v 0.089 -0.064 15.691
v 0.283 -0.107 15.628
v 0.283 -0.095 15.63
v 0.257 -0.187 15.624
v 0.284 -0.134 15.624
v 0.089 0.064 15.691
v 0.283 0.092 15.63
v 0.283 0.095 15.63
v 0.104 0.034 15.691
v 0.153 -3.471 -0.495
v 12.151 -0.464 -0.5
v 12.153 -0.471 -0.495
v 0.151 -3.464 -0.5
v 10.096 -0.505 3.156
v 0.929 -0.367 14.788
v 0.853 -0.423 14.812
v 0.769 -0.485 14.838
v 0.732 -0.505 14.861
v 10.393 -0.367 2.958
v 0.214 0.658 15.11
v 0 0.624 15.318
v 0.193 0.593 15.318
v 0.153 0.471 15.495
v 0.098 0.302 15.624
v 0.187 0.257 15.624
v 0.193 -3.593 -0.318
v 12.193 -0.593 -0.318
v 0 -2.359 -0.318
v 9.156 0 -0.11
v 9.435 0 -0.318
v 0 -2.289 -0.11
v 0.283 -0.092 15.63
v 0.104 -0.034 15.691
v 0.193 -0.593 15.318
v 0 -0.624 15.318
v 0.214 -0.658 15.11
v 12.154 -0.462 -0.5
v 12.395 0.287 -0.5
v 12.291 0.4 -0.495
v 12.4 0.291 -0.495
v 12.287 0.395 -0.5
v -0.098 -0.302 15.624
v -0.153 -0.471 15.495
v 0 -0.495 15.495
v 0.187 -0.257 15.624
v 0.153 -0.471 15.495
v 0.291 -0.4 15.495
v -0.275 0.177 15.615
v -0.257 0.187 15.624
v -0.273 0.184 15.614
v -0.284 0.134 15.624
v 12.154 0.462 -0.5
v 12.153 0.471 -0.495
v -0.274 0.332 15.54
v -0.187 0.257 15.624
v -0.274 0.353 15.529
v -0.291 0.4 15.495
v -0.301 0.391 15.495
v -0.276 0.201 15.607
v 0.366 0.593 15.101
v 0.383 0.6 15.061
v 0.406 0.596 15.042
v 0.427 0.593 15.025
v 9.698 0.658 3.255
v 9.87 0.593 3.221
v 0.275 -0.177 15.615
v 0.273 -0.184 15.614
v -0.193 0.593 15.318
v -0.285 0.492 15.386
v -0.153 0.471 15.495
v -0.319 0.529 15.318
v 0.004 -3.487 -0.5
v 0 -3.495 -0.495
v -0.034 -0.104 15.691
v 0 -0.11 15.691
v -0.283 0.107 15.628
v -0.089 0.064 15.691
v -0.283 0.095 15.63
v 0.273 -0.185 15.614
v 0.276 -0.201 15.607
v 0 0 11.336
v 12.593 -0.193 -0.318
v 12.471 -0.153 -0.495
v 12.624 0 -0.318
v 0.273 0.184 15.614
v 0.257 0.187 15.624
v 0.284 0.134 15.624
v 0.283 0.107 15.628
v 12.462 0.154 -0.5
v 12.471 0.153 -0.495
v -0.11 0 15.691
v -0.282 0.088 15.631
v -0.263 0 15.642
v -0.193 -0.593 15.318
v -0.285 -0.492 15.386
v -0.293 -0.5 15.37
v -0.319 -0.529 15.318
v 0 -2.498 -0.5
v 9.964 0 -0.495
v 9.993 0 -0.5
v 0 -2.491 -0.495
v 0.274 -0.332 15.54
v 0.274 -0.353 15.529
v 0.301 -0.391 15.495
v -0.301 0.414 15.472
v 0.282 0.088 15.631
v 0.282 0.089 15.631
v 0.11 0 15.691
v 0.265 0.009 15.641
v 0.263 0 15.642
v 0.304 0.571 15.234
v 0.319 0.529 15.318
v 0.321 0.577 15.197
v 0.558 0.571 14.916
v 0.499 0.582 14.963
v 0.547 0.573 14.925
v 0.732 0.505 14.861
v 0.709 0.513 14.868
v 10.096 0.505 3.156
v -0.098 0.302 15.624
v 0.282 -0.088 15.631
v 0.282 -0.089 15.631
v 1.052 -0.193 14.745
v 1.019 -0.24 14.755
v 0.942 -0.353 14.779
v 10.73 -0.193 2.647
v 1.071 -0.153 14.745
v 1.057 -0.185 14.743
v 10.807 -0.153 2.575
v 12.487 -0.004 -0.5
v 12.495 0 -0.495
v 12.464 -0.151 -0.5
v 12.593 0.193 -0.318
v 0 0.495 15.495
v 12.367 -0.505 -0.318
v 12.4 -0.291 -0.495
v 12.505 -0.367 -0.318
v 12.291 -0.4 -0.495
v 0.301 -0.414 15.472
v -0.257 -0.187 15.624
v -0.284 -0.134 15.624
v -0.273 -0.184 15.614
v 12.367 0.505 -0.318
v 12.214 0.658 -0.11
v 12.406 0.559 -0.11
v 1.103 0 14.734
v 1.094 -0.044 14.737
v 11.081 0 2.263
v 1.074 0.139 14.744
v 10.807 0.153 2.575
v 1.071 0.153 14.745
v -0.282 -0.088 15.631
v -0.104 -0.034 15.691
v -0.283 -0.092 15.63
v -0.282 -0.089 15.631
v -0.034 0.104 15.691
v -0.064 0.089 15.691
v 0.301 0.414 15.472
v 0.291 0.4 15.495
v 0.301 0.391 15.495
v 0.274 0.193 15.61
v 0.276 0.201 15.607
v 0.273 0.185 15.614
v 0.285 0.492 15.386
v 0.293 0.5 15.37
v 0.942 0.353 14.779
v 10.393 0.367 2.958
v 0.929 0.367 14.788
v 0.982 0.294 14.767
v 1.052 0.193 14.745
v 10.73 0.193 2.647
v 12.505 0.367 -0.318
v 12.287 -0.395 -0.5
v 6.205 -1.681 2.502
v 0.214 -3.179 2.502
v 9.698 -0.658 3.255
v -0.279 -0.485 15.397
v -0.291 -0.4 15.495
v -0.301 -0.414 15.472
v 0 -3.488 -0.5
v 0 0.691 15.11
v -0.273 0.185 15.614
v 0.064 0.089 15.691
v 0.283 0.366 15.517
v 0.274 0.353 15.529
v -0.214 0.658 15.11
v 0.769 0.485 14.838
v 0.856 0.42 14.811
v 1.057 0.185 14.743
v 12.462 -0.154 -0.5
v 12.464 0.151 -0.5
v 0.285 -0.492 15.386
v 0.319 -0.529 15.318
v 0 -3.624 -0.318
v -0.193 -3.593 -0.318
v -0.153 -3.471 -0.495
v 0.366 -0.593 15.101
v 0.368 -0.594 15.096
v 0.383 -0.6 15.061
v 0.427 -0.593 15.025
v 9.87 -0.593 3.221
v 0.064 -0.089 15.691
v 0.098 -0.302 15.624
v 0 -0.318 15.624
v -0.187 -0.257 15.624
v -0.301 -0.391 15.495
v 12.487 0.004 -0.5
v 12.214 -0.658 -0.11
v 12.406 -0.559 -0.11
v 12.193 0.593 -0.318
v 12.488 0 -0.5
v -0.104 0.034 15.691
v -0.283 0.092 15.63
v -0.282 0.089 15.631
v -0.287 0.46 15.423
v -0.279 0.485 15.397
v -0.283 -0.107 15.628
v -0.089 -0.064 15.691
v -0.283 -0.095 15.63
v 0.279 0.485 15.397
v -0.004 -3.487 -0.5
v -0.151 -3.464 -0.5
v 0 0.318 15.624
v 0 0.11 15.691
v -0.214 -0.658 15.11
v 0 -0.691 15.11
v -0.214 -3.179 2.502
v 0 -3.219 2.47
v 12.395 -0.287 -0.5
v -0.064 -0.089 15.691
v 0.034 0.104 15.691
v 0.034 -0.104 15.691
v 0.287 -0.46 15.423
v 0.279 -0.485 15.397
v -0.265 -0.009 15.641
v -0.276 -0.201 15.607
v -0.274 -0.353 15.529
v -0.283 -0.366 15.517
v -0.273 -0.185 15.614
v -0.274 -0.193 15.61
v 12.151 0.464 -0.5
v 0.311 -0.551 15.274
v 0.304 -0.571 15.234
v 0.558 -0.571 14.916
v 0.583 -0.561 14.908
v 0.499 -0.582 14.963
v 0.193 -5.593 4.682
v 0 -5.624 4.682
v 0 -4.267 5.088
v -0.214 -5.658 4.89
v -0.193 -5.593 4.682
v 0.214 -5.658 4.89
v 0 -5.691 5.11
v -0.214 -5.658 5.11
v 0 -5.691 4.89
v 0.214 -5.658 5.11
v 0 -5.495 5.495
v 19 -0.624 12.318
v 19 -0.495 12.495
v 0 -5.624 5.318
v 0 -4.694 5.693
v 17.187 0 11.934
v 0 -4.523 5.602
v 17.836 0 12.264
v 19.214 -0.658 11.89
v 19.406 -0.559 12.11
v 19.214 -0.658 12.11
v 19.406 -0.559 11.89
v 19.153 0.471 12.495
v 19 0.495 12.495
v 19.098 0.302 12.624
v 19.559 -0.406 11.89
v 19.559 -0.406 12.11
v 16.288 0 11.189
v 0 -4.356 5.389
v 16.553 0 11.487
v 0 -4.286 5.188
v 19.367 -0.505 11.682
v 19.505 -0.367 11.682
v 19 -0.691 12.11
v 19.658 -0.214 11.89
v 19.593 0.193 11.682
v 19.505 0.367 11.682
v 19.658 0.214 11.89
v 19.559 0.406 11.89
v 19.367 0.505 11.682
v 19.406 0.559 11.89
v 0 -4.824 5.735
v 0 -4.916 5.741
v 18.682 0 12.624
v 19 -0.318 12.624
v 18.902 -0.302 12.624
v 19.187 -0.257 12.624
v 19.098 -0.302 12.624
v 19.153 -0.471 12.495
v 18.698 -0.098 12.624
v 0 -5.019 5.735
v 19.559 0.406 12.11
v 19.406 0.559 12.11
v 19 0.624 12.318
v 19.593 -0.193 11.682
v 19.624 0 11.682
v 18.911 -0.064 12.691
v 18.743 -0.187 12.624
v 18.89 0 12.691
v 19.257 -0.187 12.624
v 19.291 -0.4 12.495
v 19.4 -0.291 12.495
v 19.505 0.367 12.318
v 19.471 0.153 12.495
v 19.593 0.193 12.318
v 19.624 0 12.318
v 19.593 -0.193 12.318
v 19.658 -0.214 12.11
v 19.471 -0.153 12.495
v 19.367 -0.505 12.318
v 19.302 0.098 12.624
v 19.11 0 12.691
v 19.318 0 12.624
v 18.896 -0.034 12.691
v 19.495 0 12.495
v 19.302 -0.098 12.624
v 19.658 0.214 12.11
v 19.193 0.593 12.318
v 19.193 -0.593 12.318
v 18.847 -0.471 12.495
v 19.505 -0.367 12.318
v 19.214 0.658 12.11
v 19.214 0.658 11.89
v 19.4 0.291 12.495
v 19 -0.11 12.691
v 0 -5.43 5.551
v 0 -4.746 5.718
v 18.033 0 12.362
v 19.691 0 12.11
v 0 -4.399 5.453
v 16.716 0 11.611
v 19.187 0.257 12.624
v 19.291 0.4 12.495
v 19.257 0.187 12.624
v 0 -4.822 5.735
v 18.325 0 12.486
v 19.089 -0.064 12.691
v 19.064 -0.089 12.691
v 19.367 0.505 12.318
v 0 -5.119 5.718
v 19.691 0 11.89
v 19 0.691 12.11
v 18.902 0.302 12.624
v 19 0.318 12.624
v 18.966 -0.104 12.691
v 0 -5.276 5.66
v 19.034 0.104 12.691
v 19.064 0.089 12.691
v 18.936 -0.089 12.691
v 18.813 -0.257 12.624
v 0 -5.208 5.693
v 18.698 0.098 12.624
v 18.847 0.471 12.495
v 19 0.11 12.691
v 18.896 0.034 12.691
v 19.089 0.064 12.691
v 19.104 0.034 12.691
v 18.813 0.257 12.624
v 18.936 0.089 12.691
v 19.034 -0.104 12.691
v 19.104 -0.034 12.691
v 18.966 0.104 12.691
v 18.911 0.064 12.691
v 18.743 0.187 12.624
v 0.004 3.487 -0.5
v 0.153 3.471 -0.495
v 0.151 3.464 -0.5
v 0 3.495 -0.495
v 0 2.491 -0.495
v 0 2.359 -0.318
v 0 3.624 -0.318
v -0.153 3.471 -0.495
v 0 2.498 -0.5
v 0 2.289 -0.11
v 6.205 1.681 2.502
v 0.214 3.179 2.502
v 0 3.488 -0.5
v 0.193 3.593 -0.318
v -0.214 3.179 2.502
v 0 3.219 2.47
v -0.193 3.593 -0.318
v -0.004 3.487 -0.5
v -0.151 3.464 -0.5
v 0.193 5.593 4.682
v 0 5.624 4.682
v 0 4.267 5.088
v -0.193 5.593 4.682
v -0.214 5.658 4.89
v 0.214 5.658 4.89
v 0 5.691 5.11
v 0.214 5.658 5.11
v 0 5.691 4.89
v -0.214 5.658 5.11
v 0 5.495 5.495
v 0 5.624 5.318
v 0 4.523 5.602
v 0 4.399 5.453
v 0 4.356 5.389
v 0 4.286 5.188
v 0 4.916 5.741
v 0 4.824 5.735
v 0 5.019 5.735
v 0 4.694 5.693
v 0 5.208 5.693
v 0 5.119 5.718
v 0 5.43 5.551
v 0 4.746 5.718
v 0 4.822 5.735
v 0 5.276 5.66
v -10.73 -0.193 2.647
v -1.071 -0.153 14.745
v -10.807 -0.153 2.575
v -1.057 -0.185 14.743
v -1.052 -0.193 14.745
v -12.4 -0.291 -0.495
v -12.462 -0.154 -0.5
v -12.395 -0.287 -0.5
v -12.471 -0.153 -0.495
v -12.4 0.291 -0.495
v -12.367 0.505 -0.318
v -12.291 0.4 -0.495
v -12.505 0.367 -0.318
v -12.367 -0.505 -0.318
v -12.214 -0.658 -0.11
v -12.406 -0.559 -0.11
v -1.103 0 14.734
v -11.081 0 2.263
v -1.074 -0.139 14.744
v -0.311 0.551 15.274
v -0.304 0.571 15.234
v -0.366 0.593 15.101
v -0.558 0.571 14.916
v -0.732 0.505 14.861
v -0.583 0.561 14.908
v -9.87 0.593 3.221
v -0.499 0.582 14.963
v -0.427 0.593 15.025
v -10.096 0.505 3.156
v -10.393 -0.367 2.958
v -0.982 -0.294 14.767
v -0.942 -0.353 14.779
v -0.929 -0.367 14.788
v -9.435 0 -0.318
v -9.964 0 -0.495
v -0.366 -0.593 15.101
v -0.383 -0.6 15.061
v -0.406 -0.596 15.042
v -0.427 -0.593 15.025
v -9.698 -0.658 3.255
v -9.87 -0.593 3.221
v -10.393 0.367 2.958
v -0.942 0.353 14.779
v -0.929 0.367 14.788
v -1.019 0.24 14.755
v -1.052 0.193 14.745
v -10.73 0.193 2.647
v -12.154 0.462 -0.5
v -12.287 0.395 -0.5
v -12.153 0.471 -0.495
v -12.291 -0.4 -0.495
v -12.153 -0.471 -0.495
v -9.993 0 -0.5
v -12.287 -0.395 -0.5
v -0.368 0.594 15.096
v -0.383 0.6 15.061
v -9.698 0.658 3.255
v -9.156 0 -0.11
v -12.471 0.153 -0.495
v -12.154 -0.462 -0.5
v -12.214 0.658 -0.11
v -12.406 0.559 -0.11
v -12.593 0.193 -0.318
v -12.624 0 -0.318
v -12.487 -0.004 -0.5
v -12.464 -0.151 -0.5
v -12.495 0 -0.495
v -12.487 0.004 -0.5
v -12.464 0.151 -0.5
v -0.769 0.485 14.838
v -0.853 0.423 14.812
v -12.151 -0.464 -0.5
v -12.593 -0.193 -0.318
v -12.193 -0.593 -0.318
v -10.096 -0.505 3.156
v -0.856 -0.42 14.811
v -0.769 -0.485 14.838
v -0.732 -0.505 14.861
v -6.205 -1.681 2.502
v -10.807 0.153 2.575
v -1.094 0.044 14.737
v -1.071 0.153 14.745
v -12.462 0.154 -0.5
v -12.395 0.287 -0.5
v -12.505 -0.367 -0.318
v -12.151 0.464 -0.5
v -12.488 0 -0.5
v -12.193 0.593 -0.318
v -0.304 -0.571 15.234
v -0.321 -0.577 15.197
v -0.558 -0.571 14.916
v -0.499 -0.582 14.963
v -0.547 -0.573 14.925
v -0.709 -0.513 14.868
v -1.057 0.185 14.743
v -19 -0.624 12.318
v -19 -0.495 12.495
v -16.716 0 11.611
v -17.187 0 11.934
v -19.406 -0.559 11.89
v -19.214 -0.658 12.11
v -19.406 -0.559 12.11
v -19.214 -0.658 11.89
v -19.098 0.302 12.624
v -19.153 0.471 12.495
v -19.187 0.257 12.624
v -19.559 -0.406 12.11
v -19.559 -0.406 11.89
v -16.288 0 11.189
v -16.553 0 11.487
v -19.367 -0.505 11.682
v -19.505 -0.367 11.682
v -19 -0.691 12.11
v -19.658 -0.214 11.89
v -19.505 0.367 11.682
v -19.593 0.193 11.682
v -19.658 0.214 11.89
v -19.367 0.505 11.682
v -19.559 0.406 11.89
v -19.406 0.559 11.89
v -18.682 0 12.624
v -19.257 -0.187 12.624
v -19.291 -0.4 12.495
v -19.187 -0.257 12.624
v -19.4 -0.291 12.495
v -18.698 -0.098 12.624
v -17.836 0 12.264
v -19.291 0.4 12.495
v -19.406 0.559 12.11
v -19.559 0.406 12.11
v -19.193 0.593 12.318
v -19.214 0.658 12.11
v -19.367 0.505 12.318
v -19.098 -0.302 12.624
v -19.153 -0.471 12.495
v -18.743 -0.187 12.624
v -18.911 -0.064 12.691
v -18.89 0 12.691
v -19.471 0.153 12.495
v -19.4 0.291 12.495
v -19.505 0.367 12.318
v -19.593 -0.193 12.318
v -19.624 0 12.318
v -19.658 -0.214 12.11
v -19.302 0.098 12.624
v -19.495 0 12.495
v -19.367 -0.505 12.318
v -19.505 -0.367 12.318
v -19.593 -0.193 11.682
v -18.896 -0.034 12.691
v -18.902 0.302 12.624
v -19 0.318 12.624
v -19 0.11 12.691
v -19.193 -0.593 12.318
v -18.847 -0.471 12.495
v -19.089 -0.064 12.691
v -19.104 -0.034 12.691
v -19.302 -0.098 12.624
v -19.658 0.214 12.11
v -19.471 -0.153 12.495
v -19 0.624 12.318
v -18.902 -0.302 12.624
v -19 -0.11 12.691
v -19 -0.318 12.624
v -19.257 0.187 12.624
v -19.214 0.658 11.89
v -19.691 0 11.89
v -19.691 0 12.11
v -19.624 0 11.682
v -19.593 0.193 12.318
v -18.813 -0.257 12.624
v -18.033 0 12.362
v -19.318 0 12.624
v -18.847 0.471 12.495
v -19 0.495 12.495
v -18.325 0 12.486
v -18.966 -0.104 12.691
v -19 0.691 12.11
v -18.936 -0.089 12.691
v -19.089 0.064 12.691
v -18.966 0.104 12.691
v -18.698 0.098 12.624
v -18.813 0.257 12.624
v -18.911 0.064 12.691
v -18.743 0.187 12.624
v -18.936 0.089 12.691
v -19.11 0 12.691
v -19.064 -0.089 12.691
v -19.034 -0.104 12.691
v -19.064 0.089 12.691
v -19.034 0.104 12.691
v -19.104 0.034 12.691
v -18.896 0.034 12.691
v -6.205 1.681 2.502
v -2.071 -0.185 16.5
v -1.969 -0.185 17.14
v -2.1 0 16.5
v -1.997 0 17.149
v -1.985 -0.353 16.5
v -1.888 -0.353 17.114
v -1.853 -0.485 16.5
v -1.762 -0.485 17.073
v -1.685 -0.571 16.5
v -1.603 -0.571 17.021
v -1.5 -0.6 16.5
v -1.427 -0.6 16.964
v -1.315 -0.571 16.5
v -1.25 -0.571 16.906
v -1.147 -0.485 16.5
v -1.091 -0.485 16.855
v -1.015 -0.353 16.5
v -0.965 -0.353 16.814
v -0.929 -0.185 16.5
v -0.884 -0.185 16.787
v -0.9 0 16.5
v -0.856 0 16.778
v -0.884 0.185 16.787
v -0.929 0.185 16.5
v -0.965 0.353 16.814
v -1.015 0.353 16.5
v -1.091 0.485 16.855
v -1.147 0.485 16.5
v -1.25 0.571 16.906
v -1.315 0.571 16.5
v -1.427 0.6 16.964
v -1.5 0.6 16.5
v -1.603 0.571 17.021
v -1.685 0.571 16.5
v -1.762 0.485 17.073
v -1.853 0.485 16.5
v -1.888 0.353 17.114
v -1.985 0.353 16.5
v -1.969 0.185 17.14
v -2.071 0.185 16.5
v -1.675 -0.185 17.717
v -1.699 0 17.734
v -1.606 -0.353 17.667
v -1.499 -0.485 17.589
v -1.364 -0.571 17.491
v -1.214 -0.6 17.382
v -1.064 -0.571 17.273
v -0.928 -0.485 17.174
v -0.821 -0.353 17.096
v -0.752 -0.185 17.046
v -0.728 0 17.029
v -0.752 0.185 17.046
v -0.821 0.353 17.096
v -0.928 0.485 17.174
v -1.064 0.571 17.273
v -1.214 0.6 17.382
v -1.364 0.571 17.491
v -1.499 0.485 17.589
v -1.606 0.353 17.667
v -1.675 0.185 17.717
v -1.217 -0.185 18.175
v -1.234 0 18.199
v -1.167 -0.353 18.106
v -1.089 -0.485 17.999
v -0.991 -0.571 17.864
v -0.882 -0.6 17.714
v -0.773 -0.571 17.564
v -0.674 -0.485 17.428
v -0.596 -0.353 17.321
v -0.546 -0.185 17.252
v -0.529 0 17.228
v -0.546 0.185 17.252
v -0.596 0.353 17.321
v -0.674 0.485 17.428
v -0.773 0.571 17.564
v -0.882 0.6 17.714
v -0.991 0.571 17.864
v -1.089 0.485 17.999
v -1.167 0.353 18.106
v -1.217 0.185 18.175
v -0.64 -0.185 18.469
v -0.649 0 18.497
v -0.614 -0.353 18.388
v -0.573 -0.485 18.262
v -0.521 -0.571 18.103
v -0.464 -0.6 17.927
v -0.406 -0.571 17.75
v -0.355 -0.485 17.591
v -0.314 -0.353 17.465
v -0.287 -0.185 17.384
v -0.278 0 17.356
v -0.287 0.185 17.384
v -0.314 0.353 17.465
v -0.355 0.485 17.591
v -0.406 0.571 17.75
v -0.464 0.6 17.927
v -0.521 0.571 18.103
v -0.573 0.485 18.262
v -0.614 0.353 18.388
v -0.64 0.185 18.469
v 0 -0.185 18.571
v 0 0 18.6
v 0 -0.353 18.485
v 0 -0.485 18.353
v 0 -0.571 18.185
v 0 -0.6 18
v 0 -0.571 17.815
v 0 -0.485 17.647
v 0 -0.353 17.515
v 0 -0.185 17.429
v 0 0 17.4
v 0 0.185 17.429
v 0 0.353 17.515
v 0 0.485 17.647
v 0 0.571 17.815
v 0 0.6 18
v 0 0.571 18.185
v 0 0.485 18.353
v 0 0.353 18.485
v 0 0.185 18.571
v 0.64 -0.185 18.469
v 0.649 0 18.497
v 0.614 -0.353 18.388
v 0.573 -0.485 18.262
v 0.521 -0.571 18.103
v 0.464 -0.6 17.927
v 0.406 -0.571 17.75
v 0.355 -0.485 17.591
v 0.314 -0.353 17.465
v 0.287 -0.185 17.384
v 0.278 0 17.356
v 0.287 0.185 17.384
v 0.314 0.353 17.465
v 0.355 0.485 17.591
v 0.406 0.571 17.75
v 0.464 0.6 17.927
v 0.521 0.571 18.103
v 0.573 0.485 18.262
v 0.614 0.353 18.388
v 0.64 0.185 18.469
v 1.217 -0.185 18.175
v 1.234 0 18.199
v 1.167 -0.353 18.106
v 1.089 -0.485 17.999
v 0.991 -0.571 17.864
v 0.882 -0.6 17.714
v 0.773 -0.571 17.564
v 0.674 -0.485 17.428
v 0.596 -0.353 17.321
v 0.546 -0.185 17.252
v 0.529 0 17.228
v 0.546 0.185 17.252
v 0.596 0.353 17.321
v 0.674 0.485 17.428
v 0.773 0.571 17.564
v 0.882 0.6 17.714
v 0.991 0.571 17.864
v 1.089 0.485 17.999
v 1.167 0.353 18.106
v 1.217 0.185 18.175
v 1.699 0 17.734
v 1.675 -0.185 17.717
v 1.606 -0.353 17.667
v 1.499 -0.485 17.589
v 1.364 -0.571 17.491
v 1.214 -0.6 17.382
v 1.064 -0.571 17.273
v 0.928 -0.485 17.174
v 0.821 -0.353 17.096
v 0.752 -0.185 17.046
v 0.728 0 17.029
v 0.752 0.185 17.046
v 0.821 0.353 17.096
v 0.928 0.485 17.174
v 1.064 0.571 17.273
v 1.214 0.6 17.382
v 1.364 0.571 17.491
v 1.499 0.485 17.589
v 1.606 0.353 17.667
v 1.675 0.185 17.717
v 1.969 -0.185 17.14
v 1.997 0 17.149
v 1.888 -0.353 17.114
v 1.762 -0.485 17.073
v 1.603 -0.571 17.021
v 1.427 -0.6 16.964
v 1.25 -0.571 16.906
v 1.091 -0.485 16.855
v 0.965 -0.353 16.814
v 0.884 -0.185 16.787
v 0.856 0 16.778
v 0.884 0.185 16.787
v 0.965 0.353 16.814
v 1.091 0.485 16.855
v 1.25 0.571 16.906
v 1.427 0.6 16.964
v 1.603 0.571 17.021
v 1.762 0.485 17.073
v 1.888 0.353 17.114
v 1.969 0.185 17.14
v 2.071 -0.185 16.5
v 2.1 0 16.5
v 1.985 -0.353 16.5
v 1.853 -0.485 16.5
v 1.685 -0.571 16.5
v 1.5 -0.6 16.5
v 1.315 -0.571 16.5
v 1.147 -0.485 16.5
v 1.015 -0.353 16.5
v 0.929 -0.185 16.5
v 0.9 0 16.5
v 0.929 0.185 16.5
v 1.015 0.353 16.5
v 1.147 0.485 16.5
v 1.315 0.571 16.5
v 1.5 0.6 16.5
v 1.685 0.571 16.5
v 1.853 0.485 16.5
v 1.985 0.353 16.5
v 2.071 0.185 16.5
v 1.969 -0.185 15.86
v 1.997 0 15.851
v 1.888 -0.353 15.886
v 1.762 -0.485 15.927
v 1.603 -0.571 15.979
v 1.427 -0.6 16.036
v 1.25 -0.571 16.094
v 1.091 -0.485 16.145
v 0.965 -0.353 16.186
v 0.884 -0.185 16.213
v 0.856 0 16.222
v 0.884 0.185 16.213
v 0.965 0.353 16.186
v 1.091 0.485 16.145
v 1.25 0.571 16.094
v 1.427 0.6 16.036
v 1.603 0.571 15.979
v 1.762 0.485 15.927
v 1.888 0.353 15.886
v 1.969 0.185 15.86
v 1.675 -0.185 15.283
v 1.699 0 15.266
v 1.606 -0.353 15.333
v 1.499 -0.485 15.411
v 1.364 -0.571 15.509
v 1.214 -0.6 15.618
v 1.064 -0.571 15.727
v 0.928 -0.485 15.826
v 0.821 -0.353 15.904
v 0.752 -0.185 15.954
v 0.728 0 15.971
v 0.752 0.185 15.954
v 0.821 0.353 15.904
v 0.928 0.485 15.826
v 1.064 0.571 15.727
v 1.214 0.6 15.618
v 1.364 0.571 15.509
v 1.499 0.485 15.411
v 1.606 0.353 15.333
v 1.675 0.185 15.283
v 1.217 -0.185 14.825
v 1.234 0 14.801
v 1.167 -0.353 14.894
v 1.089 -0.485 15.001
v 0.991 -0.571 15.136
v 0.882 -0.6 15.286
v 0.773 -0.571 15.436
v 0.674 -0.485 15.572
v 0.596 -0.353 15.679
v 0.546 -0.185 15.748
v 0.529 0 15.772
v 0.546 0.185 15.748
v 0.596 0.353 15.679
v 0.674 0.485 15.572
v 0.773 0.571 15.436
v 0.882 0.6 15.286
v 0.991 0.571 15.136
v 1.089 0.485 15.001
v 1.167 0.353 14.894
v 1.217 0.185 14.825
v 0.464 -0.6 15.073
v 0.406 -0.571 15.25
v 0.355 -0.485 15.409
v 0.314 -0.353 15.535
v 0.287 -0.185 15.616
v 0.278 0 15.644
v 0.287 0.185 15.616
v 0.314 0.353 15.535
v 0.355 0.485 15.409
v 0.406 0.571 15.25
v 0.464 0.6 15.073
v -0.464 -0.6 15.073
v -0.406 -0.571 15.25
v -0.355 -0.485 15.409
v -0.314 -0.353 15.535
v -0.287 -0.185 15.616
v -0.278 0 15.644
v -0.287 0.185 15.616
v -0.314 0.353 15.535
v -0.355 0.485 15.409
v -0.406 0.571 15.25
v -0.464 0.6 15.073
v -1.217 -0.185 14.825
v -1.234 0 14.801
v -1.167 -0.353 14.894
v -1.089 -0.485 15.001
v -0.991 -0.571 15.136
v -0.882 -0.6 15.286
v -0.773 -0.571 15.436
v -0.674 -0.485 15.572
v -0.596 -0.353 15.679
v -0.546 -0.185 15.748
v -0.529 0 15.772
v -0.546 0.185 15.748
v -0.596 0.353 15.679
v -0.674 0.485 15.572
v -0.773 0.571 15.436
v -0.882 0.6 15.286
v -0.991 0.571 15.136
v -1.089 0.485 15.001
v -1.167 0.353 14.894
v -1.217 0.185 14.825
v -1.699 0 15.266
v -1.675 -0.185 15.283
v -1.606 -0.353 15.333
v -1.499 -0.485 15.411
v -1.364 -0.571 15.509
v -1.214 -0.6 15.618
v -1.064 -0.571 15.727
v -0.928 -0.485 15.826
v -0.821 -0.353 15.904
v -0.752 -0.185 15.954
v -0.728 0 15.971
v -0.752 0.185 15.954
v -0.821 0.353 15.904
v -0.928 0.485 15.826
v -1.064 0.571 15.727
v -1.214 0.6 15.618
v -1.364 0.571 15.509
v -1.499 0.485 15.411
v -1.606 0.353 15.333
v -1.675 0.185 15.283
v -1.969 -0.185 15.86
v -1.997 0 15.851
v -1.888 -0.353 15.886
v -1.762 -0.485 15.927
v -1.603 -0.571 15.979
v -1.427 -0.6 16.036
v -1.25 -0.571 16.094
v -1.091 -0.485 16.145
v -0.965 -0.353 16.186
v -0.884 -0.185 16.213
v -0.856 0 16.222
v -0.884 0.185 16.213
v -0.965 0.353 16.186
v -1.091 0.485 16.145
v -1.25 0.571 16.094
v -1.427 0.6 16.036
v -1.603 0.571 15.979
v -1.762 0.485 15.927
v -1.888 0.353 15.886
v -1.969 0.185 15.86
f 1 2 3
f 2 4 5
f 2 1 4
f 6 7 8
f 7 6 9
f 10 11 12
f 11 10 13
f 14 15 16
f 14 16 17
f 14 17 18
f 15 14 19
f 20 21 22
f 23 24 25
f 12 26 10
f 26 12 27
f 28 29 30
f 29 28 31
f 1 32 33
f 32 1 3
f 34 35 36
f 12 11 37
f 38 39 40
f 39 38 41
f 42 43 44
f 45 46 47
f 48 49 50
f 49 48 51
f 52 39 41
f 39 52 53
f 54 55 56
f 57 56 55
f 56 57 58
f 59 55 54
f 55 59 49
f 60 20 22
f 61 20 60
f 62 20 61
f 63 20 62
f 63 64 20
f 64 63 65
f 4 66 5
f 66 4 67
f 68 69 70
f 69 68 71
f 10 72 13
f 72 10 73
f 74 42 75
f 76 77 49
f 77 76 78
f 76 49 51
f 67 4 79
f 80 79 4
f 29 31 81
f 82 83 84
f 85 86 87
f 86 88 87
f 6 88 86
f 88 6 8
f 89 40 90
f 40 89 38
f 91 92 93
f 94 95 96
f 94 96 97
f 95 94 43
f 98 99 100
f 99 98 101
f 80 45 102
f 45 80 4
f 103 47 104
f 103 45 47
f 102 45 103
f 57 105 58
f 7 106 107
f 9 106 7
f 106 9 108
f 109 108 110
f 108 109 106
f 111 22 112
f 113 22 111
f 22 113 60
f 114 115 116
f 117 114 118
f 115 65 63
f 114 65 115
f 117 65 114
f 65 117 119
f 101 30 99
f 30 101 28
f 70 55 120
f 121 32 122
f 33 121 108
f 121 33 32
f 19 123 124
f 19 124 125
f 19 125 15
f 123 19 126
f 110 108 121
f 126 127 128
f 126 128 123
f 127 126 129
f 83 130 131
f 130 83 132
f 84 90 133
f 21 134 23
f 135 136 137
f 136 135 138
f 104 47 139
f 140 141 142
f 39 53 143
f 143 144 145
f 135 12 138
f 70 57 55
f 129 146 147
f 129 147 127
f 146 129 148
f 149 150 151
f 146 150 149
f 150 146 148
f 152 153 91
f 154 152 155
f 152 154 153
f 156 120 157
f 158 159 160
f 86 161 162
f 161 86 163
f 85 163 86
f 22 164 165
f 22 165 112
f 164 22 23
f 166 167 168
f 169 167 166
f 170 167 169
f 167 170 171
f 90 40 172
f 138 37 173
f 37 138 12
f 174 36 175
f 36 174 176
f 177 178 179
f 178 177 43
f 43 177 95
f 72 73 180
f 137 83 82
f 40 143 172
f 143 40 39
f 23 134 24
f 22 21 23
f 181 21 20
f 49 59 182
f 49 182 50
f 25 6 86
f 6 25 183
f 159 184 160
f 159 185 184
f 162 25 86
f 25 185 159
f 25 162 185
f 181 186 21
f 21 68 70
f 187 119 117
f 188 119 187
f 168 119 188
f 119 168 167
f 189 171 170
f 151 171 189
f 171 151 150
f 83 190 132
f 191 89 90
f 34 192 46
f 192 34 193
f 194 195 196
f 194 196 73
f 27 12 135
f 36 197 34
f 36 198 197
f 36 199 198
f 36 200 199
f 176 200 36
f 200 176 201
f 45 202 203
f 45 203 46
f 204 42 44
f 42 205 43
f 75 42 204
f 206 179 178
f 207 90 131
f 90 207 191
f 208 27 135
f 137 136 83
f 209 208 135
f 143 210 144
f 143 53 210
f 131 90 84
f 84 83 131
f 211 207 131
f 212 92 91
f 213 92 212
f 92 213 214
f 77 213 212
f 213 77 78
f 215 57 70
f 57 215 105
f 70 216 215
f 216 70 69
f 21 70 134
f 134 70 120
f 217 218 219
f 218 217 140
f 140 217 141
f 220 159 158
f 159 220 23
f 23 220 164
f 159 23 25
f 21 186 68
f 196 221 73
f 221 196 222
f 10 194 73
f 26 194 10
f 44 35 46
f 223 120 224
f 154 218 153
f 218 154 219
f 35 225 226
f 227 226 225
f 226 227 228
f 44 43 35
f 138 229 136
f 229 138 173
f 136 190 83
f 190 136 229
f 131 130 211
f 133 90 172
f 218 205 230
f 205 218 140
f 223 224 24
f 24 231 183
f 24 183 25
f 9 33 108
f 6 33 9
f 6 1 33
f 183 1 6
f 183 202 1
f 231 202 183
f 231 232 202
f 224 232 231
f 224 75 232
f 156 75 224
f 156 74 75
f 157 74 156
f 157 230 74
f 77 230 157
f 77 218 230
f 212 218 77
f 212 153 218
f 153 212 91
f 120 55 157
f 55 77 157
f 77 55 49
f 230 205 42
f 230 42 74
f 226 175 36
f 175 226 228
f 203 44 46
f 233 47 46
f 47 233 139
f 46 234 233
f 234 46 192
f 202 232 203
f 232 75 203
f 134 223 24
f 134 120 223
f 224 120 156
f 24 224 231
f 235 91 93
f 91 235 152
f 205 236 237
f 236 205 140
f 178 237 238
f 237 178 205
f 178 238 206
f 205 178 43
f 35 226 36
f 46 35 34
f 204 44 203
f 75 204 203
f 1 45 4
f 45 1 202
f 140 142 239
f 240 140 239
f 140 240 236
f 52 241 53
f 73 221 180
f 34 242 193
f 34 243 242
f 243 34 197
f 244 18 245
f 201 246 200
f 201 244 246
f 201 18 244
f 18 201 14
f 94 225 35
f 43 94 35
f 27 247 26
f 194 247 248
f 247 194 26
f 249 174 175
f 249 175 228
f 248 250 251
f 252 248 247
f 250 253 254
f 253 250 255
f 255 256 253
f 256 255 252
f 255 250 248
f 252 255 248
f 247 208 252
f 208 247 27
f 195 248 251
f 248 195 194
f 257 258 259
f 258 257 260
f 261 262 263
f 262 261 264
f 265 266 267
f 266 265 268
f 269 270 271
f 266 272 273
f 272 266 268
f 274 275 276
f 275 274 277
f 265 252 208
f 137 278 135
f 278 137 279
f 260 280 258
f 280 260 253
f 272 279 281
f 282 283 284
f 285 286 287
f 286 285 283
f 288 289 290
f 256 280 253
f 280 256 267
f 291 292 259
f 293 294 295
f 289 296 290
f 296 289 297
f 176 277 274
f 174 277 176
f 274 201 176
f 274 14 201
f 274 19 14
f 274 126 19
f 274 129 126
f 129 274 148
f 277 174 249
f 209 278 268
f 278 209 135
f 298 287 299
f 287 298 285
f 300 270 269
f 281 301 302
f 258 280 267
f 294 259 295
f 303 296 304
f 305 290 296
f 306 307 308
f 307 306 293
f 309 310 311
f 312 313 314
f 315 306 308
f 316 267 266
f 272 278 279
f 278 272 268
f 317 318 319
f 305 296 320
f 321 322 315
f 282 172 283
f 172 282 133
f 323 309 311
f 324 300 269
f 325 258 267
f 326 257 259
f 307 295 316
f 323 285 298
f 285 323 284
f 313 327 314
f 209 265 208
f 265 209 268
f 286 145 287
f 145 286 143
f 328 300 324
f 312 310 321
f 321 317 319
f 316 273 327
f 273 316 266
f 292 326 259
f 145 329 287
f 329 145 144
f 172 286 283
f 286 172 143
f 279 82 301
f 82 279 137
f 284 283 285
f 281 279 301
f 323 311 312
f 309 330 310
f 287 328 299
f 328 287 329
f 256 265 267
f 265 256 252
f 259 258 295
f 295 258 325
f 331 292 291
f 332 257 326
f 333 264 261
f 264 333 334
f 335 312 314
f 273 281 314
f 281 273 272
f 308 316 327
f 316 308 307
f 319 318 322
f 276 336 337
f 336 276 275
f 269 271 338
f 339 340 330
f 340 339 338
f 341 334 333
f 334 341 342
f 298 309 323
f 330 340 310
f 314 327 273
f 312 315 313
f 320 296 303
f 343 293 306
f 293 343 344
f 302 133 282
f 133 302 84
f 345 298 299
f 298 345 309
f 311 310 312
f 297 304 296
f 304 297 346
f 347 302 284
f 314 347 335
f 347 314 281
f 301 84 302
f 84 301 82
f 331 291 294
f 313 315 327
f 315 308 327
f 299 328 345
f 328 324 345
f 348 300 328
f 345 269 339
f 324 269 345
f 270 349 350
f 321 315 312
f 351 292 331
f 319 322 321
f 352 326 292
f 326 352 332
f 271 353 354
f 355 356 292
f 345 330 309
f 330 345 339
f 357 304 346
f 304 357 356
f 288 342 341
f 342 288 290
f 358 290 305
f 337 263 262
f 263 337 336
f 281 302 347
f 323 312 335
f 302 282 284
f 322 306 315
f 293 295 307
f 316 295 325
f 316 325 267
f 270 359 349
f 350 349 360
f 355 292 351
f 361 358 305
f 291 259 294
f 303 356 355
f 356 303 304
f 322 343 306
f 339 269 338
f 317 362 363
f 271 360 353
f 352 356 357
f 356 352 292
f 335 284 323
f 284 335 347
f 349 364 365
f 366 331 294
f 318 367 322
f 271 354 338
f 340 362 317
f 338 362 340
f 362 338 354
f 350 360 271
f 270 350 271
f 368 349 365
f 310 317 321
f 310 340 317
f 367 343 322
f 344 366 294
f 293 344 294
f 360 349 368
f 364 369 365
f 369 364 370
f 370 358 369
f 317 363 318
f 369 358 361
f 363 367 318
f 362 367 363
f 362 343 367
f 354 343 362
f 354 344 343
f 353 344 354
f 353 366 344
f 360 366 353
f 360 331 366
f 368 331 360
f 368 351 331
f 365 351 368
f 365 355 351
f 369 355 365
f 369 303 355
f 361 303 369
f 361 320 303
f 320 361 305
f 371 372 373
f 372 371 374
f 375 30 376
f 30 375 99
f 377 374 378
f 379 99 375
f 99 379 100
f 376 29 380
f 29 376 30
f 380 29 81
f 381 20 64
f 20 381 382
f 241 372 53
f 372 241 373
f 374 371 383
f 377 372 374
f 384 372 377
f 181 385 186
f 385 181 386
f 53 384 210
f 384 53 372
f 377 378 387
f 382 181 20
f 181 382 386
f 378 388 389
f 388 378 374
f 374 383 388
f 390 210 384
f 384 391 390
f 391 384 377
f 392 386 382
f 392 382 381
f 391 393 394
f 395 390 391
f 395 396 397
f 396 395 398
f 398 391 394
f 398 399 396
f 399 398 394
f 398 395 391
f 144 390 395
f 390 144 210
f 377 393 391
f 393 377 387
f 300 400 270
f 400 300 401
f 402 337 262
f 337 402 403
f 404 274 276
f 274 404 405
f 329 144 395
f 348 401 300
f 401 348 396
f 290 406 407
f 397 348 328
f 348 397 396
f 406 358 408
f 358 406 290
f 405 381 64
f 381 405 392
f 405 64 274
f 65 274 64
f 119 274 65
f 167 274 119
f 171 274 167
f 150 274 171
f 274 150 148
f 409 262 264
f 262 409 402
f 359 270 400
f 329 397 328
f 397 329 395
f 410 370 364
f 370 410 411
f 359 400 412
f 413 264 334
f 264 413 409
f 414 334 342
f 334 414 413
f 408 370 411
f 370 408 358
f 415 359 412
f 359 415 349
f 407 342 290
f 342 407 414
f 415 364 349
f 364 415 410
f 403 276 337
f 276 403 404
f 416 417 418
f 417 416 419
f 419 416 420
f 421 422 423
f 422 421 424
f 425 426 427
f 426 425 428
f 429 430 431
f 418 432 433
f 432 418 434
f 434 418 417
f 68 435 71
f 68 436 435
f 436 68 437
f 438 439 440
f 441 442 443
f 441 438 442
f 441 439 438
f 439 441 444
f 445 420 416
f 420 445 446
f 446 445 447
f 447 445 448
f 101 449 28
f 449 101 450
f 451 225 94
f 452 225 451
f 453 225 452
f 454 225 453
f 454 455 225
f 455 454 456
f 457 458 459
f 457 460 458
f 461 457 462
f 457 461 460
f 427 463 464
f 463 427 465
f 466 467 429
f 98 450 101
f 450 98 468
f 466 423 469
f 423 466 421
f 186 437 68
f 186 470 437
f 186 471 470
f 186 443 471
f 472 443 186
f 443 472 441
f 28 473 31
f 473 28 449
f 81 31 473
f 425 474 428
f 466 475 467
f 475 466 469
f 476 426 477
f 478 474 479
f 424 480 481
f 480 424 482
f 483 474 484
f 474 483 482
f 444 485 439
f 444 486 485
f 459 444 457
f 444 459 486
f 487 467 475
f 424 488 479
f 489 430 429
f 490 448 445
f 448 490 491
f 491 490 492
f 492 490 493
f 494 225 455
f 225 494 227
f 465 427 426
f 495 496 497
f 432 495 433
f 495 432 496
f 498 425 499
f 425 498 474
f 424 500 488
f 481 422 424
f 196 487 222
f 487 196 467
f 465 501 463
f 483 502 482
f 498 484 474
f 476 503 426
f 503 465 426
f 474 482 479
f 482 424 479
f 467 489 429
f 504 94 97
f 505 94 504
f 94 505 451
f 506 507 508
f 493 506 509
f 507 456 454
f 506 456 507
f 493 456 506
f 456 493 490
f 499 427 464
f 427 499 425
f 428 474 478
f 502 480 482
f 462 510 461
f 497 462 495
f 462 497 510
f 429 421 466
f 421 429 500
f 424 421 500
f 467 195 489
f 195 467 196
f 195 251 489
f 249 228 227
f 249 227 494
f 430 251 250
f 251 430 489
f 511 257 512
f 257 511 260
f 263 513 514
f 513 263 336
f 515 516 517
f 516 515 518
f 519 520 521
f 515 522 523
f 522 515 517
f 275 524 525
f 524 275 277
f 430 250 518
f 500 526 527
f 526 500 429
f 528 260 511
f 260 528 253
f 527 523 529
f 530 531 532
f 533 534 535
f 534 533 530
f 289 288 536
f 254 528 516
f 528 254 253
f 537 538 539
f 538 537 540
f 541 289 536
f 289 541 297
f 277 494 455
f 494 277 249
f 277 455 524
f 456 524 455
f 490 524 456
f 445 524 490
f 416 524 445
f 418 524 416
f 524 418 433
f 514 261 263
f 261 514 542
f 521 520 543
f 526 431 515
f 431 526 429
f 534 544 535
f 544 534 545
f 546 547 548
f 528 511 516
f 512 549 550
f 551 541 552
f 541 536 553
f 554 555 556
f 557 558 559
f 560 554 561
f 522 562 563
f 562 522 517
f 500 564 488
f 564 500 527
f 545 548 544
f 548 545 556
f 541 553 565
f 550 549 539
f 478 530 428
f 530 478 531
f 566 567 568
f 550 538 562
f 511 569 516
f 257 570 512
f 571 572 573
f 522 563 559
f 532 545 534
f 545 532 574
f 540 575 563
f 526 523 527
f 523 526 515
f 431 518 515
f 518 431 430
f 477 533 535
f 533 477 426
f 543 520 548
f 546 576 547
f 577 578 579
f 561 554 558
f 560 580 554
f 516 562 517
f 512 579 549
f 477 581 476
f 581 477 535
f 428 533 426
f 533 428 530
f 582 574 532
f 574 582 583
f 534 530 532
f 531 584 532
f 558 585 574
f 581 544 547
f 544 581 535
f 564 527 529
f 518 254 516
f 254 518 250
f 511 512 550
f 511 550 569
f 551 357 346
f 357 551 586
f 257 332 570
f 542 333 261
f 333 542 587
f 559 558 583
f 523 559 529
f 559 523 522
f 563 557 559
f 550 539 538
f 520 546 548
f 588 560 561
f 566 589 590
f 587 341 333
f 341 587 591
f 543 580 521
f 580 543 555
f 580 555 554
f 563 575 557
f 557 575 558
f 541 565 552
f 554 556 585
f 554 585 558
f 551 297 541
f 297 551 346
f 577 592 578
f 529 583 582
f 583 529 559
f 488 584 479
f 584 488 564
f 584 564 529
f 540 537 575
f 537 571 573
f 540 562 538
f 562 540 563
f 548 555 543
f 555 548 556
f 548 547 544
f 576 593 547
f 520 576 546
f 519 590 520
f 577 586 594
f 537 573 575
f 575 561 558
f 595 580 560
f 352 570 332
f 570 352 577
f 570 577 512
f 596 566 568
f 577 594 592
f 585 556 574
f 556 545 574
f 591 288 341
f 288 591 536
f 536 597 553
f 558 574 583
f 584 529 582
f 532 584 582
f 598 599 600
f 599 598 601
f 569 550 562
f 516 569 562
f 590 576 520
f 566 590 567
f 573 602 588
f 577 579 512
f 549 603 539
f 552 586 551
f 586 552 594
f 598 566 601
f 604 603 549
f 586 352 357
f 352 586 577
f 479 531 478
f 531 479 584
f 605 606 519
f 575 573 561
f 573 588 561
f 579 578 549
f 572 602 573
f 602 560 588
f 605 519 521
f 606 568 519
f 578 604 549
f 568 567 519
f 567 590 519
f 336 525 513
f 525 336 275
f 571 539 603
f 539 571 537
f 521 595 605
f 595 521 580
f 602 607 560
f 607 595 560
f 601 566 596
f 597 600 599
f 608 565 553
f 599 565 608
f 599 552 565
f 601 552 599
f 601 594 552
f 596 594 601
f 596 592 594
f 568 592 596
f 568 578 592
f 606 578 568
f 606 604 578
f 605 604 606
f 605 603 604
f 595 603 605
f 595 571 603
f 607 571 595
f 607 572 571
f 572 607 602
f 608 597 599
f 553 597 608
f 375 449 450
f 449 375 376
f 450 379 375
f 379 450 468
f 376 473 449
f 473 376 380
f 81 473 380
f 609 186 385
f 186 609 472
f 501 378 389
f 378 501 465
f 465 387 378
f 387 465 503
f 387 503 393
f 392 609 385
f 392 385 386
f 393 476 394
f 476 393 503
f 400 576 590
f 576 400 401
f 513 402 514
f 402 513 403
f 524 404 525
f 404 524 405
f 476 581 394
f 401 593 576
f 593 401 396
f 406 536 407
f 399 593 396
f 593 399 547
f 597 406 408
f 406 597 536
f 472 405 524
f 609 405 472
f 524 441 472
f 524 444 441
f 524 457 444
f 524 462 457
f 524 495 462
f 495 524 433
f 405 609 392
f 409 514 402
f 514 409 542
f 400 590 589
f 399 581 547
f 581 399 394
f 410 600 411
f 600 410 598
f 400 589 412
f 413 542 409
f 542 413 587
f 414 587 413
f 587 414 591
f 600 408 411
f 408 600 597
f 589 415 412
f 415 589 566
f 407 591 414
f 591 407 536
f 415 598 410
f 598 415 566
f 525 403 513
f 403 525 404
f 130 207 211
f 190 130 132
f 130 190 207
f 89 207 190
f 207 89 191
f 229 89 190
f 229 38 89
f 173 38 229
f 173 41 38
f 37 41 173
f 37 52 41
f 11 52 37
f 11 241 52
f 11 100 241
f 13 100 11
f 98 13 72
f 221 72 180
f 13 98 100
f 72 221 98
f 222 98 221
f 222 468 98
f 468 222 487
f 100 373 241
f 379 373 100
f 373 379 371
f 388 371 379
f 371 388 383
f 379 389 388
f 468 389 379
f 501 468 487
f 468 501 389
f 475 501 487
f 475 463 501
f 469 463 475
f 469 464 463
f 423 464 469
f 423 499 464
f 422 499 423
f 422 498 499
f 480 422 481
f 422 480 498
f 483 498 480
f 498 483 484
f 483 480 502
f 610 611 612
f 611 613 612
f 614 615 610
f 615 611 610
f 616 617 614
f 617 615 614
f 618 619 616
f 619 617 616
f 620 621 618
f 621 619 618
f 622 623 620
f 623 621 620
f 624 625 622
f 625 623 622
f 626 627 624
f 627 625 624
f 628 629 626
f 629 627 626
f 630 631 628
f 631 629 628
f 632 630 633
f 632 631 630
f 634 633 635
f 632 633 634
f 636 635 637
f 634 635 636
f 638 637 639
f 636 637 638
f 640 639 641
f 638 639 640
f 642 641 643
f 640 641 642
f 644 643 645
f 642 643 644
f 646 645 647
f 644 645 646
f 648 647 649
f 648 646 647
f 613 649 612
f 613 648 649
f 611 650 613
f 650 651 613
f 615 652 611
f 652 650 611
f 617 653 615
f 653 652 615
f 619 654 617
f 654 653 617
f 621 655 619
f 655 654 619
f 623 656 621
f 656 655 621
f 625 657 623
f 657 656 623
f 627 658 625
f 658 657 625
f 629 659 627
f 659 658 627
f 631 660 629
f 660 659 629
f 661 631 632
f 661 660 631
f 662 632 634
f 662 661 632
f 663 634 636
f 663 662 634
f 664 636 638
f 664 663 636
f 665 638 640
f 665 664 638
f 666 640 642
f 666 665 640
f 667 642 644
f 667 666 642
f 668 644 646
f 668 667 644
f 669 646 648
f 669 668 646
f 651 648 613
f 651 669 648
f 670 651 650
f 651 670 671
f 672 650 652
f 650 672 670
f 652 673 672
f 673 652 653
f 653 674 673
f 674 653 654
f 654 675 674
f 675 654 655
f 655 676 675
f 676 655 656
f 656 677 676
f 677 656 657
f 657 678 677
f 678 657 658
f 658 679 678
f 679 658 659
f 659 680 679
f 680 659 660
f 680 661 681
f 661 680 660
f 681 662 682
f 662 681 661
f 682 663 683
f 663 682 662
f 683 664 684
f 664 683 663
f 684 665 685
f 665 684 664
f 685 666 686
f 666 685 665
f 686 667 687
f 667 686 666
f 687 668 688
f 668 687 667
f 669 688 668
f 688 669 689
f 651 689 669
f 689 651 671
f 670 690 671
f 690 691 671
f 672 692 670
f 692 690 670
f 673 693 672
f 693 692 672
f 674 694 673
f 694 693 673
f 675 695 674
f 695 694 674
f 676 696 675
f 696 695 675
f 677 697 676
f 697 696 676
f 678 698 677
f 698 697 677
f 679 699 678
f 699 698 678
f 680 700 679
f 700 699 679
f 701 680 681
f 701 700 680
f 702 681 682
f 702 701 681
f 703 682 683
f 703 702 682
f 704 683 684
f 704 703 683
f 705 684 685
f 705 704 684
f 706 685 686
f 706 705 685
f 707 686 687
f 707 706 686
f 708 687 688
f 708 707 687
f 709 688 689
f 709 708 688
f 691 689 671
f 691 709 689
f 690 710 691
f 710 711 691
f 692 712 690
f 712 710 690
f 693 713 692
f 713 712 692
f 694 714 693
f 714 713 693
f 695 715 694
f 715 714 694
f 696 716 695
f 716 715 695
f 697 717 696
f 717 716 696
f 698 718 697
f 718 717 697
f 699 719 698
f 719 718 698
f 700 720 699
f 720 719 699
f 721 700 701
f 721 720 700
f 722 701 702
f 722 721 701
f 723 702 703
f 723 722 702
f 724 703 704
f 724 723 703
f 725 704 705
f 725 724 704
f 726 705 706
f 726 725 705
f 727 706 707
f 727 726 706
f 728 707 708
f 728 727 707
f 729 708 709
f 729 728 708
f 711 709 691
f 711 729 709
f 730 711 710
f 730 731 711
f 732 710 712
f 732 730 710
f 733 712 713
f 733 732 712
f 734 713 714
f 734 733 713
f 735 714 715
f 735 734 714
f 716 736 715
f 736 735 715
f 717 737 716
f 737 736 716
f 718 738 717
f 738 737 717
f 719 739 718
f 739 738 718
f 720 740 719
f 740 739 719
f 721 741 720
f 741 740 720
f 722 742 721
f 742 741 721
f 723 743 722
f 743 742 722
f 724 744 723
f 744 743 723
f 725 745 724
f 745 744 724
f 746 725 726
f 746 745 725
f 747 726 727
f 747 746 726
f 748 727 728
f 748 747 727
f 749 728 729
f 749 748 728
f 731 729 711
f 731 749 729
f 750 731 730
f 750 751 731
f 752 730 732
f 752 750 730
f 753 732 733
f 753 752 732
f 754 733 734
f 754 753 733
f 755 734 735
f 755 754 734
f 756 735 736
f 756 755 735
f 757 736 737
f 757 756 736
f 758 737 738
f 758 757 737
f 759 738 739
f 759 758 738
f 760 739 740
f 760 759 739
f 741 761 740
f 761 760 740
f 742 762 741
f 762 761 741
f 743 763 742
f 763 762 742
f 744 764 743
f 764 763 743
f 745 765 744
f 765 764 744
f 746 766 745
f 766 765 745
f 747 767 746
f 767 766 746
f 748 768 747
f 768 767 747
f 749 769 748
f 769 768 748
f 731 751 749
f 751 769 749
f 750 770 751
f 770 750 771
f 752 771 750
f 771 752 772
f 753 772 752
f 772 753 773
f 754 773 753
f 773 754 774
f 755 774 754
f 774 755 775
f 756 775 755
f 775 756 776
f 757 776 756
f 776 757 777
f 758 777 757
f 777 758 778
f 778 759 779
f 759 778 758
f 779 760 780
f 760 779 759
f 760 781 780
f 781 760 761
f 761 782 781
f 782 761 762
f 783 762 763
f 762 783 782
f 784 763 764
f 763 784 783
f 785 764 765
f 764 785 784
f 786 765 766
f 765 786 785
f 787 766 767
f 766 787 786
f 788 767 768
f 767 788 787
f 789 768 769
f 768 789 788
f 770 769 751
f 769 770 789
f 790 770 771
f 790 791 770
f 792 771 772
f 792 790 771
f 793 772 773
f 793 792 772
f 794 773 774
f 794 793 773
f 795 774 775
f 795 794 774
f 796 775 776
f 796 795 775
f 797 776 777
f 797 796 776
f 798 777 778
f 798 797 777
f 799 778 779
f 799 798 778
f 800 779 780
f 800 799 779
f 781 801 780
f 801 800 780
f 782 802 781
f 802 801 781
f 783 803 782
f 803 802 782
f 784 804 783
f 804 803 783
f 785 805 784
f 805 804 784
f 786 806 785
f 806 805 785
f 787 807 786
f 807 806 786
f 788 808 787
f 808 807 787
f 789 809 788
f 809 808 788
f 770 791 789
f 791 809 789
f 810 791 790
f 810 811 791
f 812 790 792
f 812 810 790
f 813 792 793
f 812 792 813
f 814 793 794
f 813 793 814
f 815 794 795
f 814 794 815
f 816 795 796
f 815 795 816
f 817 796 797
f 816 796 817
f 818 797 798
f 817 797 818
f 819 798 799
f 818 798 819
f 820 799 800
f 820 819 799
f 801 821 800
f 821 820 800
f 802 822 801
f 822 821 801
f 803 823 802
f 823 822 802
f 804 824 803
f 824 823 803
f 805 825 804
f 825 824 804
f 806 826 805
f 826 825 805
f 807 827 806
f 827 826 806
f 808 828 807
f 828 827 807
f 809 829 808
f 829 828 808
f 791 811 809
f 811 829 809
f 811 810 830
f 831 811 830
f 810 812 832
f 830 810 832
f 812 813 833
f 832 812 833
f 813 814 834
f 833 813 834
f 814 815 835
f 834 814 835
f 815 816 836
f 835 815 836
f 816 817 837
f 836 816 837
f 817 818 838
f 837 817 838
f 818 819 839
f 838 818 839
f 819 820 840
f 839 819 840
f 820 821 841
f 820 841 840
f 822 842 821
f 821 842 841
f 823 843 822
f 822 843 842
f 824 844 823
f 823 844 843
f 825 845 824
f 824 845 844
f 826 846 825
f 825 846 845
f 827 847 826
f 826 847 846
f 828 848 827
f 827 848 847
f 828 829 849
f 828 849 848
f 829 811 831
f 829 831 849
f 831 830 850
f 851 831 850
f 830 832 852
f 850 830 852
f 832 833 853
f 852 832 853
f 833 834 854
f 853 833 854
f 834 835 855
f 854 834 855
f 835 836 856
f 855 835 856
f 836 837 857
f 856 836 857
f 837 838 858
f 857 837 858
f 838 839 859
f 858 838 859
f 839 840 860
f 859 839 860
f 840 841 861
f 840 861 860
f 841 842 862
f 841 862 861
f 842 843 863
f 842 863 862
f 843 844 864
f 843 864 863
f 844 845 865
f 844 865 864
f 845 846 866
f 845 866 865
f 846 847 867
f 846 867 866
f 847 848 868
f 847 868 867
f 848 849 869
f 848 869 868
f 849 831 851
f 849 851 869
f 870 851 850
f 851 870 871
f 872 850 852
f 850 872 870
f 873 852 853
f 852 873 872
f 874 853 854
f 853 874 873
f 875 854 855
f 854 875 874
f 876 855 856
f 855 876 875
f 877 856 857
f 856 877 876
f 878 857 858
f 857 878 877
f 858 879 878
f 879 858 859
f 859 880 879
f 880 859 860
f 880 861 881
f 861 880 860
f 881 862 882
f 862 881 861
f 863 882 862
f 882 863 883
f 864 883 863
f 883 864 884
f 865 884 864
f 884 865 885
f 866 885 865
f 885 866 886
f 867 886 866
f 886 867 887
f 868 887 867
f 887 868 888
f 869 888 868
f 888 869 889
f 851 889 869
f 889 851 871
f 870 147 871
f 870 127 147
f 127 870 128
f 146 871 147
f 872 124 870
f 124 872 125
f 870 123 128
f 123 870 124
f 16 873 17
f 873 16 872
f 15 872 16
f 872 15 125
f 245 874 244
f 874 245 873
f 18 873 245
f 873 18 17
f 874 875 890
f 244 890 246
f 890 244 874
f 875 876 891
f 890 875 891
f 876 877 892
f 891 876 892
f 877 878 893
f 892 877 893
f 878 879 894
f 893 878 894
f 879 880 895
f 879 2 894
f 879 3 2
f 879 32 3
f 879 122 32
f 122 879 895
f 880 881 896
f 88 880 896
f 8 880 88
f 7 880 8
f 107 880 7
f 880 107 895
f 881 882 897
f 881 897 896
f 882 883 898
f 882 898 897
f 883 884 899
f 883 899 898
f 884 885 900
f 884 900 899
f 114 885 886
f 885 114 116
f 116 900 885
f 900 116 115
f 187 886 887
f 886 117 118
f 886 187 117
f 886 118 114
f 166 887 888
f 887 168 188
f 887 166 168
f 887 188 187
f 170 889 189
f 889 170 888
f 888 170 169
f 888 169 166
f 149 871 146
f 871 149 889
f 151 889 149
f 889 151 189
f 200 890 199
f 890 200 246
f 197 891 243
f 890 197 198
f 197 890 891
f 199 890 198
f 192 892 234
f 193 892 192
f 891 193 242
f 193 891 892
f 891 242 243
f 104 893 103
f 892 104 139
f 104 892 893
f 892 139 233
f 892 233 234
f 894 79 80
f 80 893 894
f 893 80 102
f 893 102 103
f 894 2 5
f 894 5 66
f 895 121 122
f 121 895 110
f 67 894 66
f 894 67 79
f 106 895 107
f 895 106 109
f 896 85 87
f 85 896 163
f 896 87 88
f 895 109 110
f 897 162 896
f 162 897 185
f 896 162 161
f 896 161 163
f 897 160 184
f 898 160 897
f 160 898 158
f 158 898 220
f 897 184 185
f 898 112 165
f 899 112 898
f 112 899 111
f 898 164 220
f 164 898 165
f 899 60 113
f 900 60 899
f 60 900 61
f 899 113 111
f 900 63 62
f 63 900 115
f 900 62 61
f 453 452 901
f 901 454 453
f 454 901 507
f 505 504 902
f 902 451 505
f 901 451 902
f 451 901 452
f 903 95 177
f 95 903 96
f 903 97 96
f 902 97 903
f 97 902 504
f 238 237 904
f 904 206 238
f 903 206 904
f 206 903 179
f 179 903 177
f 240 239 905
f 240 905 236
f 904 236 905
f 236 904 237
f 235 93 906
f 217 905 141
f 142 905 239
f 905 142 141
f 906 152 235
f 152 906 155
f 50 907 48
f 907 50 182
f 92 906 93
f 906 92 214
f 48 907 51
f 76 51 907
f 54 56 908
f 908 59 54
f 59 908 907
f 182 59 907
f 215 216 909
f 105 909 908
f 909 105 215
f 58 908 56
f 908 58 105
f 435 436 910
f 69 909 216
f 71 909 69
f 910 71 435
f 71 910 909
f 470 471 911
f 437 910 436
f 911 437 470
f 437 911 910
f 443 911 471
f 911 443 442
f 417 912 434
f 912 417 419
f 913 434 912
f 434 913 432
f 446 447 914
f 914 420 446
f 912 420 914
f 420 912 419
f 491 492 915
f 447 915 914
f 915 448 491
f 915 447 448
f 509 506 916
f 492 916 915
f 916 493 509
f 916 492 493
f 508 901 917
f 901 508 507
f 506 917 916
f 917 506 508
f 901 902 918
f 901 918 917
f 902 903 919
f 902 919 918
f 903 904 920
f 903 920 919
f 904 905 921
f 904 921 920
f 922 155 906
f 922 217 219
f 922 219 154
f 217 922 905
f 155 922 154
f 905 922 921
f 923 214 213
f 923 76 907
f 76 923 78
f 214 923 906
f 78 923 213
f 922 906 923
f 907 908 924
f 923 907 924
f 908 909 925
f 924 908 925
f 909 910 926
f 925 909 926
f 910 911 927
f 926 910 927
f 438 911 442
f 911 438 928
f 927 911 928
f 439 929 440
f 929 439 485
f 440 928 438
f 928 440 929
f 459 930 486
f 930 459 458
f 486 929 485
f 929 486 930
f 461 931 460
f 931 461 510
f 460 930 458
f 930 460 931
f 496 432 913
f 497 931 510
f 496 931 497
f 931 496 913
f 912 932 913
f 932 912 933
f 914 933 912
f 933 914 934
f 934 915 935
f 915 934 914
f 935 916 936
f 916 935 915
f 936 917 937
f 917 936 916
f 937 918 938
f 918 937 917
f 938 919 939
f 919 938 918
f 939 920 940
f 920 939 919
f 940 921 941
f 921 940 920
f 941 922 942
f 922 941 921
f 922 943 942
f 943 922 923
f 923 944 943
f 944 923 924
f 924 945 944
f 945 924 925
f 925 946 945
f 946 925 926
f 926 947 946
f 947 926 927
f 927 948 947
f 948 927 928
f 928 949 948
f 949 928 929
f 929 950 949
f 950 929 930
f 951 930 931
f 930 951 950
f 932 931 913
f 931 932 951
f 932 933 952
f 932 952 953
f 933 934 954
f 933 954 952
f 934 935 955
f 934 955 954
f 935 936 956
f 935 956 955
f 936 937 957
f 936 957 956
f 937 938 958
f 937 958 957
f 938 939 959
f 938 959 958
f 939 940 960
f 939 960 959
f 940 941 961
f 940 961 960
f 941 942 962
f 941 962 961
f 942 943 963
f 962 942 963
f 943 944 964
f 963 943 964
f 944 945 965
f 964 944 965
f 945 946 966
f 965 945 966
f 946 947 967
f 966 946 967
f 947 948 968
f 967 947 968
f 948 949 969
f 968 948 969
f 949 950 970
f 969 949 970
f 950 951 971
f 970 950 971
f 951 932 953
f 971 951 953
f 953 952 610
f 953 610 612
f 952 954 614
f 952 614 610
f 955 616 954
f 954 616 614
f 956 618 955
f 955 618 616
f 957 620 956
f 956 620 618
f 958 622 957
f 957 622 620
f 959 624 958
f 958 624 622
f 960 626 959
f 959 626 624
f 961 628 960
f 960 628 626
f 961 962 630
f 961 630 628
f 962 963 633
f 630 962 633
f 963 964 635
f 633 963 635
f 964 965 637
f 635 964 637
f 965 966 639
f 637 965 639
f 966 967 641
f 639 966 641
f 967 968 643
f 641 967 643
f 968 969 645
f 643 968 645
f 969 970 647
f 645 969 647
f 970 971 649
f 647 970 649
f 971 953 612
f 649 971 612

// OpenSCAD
r = 0.7;
rframe = 0.6;
Rloop = 1.5;
a = [0,0,15];
b = [12,0,0];
c = [0,-3,0];
d = [0,-5,5];
e = [19,0,12];
fineness=20;

intersection() {
  fourarm();
  translate([-50,-50,-0.5]) cube([100,100,100]);
}

translate([0,0,16.5]) rotate(a=90, v=[1,0,0]) hookloop();

module fourarm() {
	biarm();
    scale([-1,1,1]) biarm();
}

module biarm() {
  arm();
  scale([1,-1,1]) arm();
}

module arm() {
  face(a,b,c);
  face(b,c,d);
  face(d,b,e);
}

module face(A,B,C) {
  hull(){
    translate(A) sphere(r,$fn=fineness);
    translate(B) sphere(r,$fn=fineness);
    translate(C) sphere(r,$fn=fineness);
  }
}

module hookloop() {
  rotate_extrude(convexity = 4,$fn=fineness)
    translate([Rloop, 0, 0])
    circle(r = rframe, $fn = fineness);
}
